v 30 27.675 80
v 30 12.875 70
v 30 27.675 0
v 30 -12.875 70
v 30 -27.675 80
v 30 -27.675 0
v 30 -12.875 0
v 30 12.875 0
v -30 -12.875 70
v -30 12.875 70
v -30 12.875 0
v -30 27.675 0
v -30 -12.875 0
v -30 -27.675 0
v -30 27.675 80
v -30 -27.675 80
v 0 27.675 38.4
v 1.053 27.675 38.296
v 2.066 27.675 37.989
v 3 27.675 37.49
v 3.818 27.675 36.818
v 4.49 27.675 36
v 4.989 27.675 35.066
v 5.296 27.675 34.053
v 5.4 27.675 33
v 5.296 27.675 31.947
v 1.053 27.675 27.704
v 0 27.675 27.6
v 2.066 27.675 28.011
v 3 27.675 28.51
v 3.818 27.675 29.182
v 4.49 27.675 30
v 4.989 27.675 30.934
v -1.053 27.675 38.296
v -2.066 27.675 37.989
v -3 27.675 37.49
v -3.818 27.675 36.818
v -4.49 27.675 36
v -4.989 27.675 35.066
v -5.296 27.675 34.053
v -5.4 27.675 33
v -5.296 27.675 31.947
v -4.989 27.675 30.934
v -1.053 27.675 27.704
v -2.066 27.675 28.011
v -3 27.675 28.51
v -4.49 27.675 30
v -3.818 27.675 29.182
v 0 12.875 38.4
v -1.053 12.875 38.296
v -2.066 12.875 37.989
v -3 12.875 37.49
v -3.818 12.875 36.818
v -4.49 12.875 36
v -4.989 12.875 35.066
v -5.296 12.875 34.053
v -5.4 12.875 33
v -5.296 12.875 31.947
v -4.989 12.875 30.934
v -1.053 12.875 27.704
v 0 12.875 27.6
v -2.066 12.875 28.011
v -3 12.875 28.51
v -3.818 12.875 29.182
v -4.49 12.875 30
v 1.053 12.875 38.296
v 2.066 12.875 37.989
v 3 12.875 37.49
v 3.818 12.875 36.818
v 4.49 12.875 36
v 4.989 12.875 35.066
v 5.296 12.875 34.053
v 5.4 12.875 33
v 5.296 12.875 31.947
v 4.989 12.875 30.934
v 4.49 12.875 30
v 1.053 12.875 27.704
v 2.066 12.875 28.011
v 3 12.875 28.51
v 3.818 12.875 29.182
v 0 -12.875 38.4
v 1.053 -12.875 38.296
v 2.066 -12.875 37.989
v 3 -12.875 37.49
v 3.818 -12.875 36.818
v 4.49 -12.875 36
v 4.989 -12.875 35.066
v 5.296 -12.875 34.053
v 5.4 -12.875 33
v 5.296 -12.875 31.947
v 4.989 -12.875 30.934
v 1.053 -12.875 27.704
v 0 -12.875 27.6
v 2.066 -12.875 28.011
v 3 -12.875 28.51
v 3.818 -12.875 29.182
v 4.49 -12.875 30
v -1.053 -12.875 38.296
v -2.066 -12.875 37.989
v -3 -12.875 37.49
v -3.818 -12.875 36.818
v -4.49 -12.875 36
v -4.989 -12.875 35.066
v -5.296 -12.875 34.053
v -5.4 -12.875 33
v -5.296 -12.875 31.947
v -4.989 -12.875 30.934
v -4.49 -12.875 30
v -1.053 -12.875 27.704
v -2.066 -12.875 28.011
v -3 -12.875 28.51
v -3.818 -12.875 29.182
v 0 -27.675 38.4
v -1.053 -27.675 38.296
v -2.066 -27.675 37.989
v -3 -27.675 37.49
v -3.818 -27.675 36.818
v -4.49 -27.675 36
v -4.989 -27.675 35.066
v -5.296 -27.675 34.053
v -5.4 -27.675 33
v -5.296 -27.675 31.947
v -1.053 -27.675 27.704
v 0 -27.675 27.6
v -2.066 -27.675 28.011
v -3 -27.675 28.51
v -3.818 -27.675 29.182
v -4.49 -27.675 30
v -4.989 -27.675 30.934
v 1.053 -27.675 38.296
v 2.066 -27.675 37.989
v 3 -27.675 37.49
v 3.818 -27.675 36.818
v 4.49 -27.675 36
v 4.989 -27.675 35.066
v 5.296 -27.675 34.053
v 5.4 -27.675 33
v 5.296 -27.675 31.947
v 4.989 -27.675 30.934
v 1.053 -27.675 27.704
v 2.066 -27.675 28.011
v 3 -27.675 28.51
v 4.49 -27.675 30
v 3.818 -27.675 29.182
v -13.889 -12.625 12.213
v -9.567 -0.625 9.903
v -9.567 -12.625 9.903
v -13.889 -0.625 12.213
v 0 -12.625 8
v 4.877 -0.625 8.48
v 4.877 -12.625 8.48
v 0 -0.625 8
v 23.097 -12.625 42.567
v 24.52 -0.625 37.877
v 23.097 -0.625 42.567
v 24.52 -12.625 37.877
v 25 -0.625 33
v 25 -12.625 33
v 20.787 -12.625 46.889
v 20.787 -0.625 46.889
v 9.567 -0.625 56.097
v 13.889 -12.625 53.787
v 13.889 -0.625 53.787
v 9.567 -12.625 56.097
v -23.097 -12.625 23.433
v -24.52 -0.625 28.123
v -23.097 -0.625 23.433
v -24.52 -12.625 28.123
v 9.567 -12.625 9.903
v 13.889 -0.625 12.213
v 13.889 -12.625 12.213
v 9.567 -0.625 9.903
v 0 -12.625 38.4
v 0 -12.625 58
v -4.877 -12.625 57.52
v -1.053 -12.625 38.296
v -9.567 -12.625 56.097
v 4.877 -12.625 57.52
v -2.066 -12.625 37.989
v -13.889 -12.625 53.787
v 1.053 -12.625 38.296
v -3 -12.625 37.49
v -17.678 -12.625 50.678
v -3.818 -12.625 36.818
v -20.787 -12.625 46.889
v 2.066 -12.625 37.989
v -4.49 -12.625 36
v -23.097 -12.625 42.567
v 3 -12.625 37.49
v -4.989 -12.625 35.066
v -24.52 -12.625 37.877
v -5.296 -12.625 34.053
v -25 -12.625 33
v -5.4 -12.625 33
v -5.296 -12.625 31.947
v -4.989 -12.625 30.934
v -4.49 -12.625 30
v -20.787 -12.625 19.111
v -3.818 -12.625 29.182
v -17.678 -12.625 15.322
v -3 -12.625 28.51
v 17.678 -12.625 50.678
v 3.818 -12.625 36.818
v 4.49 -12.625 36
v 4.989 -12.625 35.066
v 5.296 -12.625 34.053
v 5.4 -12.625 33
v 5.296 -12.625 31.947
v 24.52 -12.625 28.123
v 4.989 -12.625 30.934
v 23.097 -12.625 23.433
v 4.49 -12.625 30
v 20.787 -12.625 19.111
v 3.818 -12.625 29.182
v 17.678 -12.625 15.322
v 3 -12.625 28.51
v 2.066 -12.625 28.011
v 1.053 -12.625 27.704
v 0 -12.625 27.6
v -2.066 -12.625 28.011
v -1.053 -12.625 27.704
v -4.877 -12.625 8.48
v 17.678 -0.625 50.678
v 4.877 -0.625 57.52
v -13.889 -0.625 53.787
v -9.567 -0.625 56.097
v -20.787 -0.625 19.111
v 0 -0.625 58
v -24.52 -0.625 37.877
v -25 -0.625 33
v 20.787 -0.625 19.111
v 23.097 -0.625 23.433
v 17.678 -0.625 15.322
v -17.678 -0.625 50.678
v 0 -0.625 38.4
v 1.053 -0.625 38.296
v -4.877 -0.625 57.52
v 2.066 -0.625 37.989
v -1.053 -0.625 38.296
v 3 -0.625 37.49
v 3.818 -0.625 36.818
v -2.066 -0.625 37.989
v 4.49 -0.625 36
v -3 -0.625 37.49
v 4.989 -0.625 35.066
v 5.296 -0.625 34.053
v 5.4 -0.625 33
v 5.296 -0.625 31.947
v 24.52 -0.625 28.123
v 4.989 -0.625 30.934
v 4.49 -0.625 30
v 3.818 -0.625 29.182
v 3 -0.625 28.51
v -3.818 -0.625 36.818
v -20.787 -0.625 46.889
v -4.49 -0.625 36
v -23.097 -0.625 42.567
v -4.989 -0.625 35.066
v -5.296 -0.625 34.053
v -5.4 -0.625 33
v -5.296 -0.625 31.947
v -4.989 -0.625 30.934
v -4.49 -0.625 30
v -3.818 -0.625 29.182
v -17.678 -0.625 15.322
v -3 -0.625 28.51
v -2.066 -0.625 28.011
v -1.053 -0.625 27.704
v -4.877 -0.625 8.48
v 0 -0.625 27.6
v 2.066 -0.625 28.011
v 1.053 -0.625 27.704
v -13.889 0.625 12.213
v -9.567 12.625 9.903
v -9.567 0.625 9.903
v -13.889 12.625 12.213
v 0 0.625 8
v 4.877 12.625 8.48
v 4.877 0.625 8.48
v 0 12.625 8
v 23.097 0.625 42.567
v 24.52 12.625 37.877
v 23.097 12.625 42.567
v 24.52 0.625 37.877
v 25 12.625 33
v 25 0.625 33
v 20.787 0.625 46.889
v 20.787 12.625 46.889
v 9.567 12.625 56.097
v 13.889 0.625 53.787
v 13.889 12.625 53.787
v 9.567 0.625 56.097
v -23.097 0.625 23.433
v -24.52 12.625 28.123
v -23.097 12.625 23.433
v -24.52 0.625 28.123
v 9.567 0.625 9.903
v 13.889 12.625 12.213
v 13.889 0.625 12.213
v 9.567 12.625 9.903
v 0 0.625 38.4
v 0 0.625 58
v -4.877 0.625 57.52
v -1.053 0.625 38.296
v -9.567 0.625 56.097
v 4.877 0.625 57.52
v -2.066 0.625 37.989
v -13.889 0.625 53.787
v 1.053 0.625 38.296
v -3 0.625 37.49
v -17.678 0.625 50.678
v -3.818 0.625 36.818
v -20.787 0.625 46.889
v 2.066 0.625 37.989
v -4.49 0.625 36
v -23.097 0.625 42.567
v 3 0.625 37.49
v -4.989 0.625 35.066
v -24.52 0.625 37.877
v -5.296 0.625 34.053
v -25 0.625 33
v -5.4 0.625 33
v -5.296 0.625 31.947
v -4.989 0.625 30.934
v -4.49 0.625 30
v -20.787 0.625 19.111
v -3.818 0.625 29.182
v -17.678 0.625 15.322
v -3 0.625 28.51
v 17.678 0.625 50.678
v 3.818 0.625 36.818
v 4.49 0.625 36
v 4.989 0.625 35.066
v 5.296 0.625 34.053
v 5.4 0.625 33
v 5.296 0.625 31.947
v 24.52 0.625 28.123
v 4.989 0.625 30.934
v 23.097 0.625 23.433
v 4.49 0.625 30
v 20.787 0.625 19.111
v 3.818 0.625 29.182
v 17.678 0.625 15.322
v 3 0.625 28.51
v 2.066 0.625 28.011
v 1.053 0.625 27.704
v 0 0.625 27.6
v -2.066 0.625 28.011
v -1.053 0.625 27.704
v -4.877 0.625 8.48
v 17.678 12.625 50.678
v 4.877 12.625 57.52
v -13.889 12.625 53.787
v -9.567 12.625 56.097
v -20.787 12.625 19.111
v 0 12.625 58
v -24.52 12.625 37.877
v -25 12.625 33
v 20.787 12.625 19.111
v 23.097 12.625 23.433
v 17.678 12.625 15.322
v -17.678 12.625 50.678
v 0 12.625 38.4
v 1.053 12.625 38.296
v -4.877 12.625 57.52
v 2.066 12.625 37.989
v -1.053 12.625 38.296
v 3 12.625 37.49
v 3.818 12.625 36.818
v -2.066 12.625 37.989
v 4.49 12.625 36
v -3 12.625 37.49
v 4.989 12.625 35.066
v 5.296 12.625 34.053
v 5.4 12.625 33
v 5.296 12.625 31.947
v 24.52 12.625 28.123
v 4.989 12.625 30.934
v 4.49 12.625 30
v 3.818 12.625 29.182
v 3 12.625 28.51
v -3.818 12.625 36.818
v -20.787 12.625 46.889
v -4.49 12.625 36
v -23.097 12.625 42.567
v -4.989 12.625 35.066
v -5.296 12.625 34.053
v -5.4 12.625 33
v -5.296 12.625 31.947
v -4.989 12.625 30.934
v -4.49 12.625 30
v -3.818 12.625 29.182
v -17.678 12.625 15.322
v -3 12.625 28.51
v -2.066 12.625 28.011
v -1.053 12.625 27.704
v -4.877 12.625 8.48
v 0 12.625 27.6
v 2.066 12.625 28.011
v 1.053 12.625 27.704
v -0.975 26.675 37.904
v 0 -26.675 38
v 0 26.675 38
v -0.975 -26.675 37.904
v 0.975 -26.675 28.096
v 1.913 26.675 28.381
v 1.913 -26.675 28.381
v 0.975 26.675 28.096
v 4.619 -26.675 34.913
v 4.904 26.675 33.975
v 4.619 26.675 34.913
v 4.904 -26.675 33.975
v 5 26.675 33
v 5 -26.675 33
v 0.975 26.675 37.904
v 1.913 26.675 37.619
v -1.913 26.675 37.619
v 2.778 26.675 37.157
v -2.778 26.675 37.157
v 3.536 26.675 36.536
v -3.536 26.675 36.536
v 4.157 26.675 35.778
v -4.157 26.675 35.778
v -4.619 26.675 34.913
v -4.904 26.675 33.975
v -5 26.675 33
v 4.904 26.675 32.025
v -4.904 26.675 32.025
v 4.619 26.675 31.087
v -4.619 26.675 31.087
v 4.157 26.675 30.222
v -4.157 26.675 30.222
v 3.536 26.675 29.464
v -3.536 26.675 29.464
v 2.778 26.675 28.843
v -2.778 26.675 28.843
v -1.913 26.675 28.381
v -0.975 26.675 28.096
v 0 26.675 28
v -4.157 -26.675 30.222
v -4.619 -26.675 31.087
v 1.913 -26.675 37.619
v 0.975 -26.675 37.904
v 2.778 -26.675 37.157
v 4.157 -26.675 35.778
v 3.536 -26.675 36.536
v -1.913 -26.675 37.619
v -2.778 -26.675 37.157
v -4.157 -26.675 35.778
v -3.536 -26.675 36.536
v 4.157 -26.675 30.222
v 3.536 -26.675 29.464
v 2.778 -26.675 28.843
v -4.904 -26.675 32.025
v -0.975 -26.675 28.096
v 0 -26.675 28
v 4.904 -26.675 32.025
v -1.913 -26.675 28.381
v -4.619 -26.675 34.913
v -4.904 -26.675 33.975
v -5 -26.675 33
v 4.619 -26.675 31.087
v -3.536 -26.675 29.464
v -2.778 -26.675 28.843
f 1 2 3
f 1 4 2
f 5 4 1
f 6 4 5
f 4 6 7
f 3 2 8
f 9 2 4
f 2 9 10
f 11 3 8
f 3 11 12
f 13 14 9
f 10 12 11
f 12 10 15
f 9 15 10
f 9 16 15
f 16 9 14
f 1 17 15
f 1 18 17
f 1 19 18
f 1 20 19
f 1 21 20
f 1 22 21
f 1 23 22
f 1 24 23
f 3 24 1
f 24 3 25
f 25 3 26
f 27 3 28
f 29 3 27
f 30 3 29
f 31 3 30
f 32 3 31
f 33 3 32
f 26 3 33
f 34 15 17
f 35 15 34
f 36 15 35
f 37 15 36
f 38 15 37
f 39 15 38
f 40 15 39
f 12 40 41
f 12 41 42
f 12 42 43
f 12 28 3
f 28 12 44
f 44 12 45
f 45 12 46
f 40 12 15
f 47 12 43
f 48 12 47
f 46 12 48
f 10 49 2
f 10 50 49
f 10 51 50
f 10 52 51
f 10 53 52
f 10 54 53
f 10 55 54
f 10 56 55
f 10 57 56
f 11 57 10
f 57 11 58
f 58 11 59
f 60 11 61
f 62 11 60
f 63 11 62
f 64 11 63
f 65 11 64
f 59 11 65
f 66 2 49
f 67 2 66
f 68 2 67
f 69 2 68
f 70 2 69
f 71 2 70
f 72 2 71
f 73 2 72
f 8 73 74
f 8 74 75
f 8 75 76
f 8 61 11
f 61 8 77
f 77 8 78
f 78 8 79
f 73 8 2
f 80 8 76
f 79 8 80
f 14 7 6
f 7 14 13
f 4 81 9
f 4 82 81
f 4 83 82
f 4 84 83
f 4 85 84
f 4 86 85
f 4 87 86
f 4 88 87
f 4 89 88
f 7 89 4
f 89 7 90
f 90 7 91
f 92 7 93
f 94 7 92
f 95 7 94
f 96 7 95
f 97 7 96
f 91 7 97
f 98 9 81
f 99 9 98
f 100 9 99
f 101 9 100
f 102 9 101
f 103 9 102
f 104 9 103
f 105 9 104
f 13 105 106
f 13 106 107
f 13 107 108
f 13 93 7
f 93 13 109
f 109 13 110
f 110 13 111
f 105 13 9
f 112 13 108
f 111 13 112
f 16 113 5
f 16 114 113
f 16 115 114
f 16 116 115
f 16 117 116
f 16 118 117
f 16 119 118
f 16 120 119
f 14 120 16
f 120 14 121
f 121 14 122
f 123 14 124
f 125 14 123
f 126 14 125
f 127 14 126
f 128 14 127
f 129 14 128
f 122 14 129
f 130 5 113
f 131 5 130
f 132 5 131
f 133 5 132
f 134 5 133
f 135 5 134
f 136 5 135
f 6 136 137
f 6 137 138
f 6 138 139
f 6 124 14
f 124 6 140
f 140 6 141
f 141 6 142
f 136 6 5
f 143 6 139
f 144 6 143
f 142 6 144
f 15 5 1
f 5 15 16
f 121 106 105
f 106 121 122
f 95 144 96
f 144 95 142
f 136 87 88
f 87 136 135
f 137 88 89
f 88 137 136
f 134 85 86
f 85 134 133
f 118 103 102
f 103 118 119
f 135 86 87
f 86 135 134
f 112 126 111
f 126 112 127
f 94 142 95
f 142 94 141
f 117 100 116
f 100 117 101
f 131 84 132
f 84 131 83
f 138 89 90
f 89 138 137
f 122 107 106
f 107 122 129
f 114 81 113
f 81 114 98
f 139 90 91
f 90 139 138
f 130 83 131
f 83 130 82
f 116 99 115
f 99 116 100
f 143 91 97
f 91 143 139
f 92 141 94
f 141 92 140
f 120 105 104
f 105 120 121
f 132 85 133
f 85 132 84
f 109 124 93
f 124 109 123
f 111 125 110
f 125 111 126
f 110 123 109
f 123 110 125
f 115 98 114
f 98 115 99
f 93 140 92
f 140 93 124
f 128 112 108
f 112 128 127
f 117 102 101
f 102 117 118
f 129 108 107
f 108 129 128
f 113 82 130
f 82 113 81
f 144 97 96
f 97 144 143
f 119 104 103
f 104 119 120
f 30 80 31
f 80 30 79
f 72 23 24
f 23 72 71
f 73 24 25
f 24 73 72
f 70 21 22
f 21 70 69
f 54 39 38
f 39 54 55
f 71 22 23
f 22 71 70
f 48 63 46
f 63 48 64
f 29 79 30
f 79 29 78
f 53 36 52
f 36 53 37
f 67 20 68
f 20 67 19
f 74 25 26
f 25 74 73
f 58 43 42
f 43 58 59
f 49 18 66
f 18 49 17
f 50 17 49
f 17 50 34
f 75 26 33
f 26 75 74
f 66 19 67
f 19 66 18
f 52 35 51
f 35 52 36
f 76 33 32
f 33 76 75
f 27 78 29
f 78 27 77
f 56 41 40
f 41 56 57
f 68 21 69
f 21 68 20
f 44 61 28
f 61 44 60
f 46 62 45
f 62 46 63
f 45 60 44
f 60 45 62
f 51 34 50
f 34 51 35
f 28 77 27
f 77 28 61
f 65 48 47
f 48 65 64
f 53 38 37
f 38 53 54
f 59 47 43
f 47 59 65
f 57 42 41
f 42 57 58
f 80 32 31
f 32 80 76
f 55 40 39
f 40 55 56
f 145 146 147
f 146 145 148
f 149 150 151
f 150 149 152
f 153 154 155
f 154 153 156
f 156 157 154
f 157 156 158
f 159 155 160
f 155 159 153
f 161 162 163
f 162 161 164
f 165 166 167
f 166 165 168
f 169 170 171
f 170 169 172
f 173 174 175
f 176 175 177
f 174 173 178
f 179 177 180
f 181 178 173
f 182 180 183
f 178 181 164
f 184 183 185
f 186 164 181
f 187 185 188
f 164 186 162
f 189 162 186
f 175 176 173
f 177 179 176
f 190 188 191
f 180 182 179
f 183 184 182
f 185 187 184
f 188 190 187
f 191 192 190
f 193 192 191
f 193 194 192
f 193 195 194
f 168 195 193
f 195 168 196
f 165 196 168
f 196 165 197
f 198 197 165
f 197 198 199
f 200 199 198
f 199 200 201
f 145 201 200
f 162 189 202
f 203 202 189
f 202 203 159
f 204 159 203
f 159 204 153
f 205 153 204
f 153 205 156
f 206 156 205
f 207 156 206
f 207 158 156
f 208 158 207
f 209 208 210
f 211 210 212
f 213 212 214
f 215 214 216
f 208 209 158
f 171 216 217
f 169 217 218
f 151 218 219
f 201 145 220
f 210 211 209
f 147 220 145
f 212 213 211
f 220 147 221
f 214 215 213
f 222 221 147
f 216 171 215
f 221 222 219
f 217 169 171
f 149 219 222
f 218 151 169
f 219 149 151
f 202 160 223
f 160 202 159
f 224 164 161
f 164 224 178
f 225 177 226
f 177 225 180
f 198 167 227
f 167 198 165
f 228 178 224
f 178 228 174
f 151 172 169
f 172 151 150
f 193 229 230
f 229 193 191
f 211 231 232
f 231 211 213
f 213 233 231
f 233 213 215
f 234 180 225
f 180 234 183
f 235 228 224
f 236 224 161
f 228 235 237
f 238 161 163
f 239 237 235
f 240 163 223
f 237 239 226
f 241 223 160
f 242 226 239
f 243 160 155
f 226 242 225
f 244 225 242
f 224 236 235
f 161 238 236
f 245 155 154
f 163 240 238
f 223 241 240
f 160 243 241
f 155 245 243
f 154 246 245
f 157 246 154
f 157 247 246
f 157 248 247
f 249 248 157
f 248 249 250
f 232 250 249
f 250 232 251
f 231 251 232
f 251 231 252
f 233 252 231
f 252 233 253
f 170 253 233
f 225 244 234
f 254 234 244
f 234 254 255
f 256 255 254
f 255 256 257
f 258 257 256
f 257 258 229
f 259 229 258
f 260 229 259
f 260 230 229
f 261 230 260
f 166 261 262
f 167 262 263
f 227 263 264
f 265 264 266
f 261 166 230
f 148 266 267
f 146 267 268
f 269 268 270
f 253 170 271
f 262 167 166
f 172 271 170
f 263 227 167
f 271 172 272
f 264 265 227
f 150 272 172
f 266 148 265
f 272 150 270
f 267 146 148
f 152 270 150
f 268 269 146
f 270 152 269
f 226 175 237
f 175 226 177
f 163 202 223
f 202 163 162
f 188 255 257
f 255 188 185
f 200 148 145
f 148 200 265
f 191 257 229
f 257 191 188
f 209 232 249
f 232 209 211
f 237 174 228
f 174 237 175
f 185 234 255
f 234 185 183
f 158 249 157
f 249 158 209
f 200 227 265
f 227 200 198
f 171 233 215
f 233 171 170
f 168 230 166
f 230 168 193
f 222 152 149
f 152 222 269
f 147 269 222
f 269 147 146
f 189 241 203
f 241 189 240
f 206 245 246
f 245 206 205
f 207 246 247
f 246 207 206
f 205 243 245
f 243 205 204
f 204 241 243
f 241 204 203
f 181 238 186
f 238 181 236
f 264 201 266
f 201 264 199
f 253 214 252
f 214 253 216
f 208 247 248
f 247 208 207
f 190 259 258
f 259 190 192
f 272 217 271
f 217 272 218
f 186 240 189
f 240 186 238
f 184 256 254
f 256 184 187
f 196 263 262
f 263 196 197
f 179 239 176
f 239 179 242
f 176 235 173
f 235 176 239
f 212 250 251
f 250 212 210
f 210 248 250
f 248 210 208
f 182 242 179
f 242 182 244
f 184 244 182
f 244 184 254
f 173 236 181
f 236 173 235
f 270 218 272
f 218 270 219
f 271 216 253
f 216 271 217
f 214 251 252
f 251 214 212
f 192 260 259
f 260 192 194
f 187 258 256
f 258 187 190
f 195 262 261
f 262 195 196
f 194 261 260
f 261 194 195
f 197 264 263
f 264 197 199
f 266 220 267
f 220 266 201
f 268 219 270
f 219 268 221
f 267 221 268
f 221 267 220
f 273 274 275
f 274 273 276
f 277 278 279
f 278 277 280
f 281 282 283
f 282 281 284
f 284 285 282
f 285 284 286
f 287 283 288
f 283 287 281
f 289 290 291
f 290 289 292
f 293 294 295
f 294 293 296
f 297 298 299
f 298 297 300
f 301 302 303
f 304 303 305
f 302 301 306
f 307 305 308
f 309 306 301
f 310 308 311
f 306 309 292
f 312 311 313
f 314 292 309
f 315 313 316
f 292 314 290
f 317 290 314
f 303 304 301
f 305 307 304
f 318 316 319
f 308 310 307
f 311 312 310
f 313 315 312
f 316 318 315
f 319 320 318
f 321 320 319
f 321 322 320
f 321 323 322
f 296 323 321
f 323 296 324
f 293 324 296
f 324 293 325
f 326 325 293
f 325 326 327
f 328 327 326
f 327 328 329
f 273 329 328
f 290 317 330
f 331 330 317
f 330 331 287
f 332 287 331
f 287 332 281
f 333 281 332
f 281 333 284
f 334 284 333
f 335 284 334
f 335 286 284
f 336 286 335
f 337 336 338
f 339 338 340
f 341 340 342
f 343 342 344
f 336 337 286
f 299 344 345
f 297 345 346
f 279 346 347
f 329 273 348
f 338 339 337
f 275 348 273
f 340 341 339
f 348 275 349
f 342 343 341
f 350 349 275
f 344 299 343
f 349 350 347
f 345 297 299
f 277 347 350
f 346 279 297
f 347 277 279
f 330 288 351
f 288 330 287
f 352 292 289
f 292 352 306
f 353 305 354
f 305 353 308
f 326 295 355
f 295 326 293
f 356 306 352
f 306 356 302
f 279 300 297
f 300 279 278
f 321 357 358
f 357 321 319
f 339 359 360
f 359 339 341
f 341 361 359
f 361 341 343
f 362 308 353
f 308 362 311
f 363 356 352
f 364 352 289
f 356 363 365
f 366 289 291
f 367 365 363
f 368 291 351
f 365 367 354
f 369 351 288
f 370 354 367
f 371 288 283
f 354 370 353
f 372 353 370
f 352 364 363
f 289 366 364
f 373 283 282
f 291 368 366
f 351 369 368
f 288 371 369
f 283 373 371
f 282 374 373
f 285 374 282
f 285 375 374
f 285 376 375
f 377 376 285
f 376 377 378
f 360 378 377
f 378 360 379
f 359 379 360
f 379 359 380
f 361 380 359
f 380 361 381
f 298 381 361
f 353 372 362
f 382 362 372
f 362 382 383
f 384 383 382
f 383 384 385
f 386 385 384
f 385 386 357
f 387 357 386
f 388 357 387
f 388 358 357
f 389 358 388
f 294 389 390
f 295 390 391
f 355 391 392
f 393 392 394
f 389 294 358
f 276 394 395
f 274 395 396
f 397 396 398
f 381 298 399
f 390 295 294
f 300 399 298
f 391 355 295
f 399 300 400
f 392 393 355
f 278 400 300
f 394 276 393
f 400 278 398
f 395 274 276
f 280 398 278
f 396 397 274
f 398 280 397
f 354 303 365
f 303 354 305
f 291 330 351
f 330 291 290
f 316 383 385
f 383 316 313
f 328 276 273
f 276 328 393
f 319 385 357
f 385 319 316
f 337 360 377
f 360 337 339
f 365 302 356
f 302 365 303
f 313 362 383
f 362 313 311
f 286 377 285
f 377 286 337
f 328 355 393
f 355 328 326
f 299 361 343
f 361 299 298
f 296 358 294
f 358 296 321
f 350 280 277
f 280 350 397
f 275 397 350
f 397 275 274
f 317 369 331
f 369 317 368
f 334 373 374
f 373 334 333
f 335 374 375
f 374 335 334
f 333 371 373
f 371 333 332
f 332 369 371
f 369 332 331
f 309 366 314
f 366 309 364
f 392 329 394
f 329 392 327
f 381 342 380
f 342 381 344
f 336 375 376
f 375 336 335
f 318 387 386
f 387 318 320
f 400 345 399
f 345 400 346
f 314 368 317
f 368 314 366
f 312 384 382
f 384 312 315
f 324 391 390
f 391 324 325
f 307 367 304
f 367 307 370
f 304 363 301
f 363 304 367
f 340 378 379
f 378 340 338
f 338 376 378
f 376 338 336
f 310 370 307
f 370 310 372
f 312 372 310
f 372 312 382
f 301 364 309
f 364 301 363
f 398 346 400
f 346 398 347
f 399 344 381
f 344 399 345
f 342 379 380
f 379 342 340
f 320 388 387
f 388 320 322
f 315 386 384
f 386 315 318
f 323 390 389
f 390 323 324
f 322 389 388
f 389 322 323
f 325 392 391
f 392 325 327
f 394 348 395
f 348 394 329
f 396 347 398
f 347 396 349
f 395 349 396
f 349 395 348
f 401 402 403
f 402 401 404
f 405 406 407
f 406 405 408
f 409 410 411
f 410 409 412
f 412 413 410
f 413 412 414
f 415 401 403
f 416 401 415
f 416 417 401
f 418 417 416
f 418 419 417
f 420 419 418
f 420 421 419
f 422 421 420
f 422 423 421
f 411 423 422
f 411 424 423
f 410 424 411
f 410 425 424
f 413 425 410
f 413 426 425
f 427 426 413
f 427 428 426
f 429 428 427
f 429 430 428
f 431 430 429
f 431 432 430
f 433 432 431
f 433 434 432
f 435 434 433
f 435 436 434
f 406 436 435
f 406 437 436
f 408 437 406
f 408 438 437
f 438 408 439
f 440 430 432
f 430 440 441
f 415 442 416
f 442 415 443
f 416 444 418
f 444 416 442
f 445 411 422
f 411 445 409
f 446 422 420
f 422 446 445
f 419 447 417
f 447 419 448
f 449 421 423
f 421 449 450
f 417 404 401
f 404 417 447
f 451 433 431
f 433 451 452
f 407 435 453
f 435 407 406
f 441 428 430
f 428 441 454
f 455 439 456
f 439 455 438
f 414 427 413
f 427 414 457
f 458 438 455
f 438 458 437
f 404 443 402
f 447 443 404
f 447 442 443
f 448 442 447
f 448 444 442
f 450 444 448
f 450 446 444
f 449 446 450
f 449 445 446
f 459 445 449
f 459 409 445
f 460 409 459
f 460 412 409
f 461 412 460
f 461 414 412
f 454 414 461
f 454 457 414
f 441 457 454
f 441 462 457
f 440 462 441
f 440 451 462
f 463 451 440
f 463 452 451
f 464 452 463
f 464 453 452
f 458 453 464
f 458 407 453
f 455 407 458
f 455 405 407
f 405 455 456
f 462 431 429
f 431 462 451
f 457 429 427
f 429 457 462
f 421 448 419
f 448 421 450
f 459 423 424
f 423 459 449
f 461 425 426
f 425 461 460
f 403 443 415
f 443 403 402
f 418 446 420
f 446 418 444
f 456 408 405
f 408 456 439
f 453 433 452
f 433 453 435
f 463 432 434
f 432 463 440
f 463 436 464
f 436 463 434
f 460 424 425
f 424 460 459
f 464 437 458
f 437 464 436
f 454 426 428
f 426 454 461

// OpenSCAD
$fn = 32;

// ------------------------------------------------------------------------
// Trolley wheel set: wheels d50, fork 70 mm tall
// Every part is its own module, assembly() places every instance.
// ------------------------------------------------------------------------

// --- part 1 ---
module trolley_fork() {
  difference() {
    union() {
      translate([-30, 12.875, 0]) cube([60, 14.8, 70]);
      translate([-30, -27.675, 0]) cube([60, 14.8, 70]);
      translate([-30, -27.675, 70]) cube([60, 55.35, 10]);
    }
    translate([0, -20.275, 33]) rotate([90, 0, 0]) cylinder(h = 16.8, d = 10.8, center = true);
    translate([0, 20.275, 33]) rotate([90, 0, 0]) cylinder(h = 16.8, d = 10.8, center = true);
  }
}

// --- part 2 ---
module trolley_wheel() {
  difference() {
      translate([0, 0, 0]) cylinder(h = 12, d = 50);
      translate([0, 0, -1]) cylinder(h = 14, d = 10.8);
    }
}

// --- part 3 ---
module trolley_axle() {
  translate([0, 0, -26.675]) cylinder(h = 53.35, d = 10);
}

// --- assembly ---
module assembly() {
  color([0.80, 0.24, 0.20]) translate([0, 0, 0]) rotate([0, 0, 0]) trolley_fork();
  color([0.20, 0.45, 0.75]) translate([0, -0.625, 33]) rotate([90, 0, 0]) trolley_wheel();
  color([0.25, 0.62, 0.32]) translate([0, 12.625, 33]) rotate([90, 0, 0]) trolley_wheel();
  color([0.92, 0.70, 0.18]) translate([0, 0, 33]) rotate([90, 0, 0]) trolley_axle();
}

assembly();
